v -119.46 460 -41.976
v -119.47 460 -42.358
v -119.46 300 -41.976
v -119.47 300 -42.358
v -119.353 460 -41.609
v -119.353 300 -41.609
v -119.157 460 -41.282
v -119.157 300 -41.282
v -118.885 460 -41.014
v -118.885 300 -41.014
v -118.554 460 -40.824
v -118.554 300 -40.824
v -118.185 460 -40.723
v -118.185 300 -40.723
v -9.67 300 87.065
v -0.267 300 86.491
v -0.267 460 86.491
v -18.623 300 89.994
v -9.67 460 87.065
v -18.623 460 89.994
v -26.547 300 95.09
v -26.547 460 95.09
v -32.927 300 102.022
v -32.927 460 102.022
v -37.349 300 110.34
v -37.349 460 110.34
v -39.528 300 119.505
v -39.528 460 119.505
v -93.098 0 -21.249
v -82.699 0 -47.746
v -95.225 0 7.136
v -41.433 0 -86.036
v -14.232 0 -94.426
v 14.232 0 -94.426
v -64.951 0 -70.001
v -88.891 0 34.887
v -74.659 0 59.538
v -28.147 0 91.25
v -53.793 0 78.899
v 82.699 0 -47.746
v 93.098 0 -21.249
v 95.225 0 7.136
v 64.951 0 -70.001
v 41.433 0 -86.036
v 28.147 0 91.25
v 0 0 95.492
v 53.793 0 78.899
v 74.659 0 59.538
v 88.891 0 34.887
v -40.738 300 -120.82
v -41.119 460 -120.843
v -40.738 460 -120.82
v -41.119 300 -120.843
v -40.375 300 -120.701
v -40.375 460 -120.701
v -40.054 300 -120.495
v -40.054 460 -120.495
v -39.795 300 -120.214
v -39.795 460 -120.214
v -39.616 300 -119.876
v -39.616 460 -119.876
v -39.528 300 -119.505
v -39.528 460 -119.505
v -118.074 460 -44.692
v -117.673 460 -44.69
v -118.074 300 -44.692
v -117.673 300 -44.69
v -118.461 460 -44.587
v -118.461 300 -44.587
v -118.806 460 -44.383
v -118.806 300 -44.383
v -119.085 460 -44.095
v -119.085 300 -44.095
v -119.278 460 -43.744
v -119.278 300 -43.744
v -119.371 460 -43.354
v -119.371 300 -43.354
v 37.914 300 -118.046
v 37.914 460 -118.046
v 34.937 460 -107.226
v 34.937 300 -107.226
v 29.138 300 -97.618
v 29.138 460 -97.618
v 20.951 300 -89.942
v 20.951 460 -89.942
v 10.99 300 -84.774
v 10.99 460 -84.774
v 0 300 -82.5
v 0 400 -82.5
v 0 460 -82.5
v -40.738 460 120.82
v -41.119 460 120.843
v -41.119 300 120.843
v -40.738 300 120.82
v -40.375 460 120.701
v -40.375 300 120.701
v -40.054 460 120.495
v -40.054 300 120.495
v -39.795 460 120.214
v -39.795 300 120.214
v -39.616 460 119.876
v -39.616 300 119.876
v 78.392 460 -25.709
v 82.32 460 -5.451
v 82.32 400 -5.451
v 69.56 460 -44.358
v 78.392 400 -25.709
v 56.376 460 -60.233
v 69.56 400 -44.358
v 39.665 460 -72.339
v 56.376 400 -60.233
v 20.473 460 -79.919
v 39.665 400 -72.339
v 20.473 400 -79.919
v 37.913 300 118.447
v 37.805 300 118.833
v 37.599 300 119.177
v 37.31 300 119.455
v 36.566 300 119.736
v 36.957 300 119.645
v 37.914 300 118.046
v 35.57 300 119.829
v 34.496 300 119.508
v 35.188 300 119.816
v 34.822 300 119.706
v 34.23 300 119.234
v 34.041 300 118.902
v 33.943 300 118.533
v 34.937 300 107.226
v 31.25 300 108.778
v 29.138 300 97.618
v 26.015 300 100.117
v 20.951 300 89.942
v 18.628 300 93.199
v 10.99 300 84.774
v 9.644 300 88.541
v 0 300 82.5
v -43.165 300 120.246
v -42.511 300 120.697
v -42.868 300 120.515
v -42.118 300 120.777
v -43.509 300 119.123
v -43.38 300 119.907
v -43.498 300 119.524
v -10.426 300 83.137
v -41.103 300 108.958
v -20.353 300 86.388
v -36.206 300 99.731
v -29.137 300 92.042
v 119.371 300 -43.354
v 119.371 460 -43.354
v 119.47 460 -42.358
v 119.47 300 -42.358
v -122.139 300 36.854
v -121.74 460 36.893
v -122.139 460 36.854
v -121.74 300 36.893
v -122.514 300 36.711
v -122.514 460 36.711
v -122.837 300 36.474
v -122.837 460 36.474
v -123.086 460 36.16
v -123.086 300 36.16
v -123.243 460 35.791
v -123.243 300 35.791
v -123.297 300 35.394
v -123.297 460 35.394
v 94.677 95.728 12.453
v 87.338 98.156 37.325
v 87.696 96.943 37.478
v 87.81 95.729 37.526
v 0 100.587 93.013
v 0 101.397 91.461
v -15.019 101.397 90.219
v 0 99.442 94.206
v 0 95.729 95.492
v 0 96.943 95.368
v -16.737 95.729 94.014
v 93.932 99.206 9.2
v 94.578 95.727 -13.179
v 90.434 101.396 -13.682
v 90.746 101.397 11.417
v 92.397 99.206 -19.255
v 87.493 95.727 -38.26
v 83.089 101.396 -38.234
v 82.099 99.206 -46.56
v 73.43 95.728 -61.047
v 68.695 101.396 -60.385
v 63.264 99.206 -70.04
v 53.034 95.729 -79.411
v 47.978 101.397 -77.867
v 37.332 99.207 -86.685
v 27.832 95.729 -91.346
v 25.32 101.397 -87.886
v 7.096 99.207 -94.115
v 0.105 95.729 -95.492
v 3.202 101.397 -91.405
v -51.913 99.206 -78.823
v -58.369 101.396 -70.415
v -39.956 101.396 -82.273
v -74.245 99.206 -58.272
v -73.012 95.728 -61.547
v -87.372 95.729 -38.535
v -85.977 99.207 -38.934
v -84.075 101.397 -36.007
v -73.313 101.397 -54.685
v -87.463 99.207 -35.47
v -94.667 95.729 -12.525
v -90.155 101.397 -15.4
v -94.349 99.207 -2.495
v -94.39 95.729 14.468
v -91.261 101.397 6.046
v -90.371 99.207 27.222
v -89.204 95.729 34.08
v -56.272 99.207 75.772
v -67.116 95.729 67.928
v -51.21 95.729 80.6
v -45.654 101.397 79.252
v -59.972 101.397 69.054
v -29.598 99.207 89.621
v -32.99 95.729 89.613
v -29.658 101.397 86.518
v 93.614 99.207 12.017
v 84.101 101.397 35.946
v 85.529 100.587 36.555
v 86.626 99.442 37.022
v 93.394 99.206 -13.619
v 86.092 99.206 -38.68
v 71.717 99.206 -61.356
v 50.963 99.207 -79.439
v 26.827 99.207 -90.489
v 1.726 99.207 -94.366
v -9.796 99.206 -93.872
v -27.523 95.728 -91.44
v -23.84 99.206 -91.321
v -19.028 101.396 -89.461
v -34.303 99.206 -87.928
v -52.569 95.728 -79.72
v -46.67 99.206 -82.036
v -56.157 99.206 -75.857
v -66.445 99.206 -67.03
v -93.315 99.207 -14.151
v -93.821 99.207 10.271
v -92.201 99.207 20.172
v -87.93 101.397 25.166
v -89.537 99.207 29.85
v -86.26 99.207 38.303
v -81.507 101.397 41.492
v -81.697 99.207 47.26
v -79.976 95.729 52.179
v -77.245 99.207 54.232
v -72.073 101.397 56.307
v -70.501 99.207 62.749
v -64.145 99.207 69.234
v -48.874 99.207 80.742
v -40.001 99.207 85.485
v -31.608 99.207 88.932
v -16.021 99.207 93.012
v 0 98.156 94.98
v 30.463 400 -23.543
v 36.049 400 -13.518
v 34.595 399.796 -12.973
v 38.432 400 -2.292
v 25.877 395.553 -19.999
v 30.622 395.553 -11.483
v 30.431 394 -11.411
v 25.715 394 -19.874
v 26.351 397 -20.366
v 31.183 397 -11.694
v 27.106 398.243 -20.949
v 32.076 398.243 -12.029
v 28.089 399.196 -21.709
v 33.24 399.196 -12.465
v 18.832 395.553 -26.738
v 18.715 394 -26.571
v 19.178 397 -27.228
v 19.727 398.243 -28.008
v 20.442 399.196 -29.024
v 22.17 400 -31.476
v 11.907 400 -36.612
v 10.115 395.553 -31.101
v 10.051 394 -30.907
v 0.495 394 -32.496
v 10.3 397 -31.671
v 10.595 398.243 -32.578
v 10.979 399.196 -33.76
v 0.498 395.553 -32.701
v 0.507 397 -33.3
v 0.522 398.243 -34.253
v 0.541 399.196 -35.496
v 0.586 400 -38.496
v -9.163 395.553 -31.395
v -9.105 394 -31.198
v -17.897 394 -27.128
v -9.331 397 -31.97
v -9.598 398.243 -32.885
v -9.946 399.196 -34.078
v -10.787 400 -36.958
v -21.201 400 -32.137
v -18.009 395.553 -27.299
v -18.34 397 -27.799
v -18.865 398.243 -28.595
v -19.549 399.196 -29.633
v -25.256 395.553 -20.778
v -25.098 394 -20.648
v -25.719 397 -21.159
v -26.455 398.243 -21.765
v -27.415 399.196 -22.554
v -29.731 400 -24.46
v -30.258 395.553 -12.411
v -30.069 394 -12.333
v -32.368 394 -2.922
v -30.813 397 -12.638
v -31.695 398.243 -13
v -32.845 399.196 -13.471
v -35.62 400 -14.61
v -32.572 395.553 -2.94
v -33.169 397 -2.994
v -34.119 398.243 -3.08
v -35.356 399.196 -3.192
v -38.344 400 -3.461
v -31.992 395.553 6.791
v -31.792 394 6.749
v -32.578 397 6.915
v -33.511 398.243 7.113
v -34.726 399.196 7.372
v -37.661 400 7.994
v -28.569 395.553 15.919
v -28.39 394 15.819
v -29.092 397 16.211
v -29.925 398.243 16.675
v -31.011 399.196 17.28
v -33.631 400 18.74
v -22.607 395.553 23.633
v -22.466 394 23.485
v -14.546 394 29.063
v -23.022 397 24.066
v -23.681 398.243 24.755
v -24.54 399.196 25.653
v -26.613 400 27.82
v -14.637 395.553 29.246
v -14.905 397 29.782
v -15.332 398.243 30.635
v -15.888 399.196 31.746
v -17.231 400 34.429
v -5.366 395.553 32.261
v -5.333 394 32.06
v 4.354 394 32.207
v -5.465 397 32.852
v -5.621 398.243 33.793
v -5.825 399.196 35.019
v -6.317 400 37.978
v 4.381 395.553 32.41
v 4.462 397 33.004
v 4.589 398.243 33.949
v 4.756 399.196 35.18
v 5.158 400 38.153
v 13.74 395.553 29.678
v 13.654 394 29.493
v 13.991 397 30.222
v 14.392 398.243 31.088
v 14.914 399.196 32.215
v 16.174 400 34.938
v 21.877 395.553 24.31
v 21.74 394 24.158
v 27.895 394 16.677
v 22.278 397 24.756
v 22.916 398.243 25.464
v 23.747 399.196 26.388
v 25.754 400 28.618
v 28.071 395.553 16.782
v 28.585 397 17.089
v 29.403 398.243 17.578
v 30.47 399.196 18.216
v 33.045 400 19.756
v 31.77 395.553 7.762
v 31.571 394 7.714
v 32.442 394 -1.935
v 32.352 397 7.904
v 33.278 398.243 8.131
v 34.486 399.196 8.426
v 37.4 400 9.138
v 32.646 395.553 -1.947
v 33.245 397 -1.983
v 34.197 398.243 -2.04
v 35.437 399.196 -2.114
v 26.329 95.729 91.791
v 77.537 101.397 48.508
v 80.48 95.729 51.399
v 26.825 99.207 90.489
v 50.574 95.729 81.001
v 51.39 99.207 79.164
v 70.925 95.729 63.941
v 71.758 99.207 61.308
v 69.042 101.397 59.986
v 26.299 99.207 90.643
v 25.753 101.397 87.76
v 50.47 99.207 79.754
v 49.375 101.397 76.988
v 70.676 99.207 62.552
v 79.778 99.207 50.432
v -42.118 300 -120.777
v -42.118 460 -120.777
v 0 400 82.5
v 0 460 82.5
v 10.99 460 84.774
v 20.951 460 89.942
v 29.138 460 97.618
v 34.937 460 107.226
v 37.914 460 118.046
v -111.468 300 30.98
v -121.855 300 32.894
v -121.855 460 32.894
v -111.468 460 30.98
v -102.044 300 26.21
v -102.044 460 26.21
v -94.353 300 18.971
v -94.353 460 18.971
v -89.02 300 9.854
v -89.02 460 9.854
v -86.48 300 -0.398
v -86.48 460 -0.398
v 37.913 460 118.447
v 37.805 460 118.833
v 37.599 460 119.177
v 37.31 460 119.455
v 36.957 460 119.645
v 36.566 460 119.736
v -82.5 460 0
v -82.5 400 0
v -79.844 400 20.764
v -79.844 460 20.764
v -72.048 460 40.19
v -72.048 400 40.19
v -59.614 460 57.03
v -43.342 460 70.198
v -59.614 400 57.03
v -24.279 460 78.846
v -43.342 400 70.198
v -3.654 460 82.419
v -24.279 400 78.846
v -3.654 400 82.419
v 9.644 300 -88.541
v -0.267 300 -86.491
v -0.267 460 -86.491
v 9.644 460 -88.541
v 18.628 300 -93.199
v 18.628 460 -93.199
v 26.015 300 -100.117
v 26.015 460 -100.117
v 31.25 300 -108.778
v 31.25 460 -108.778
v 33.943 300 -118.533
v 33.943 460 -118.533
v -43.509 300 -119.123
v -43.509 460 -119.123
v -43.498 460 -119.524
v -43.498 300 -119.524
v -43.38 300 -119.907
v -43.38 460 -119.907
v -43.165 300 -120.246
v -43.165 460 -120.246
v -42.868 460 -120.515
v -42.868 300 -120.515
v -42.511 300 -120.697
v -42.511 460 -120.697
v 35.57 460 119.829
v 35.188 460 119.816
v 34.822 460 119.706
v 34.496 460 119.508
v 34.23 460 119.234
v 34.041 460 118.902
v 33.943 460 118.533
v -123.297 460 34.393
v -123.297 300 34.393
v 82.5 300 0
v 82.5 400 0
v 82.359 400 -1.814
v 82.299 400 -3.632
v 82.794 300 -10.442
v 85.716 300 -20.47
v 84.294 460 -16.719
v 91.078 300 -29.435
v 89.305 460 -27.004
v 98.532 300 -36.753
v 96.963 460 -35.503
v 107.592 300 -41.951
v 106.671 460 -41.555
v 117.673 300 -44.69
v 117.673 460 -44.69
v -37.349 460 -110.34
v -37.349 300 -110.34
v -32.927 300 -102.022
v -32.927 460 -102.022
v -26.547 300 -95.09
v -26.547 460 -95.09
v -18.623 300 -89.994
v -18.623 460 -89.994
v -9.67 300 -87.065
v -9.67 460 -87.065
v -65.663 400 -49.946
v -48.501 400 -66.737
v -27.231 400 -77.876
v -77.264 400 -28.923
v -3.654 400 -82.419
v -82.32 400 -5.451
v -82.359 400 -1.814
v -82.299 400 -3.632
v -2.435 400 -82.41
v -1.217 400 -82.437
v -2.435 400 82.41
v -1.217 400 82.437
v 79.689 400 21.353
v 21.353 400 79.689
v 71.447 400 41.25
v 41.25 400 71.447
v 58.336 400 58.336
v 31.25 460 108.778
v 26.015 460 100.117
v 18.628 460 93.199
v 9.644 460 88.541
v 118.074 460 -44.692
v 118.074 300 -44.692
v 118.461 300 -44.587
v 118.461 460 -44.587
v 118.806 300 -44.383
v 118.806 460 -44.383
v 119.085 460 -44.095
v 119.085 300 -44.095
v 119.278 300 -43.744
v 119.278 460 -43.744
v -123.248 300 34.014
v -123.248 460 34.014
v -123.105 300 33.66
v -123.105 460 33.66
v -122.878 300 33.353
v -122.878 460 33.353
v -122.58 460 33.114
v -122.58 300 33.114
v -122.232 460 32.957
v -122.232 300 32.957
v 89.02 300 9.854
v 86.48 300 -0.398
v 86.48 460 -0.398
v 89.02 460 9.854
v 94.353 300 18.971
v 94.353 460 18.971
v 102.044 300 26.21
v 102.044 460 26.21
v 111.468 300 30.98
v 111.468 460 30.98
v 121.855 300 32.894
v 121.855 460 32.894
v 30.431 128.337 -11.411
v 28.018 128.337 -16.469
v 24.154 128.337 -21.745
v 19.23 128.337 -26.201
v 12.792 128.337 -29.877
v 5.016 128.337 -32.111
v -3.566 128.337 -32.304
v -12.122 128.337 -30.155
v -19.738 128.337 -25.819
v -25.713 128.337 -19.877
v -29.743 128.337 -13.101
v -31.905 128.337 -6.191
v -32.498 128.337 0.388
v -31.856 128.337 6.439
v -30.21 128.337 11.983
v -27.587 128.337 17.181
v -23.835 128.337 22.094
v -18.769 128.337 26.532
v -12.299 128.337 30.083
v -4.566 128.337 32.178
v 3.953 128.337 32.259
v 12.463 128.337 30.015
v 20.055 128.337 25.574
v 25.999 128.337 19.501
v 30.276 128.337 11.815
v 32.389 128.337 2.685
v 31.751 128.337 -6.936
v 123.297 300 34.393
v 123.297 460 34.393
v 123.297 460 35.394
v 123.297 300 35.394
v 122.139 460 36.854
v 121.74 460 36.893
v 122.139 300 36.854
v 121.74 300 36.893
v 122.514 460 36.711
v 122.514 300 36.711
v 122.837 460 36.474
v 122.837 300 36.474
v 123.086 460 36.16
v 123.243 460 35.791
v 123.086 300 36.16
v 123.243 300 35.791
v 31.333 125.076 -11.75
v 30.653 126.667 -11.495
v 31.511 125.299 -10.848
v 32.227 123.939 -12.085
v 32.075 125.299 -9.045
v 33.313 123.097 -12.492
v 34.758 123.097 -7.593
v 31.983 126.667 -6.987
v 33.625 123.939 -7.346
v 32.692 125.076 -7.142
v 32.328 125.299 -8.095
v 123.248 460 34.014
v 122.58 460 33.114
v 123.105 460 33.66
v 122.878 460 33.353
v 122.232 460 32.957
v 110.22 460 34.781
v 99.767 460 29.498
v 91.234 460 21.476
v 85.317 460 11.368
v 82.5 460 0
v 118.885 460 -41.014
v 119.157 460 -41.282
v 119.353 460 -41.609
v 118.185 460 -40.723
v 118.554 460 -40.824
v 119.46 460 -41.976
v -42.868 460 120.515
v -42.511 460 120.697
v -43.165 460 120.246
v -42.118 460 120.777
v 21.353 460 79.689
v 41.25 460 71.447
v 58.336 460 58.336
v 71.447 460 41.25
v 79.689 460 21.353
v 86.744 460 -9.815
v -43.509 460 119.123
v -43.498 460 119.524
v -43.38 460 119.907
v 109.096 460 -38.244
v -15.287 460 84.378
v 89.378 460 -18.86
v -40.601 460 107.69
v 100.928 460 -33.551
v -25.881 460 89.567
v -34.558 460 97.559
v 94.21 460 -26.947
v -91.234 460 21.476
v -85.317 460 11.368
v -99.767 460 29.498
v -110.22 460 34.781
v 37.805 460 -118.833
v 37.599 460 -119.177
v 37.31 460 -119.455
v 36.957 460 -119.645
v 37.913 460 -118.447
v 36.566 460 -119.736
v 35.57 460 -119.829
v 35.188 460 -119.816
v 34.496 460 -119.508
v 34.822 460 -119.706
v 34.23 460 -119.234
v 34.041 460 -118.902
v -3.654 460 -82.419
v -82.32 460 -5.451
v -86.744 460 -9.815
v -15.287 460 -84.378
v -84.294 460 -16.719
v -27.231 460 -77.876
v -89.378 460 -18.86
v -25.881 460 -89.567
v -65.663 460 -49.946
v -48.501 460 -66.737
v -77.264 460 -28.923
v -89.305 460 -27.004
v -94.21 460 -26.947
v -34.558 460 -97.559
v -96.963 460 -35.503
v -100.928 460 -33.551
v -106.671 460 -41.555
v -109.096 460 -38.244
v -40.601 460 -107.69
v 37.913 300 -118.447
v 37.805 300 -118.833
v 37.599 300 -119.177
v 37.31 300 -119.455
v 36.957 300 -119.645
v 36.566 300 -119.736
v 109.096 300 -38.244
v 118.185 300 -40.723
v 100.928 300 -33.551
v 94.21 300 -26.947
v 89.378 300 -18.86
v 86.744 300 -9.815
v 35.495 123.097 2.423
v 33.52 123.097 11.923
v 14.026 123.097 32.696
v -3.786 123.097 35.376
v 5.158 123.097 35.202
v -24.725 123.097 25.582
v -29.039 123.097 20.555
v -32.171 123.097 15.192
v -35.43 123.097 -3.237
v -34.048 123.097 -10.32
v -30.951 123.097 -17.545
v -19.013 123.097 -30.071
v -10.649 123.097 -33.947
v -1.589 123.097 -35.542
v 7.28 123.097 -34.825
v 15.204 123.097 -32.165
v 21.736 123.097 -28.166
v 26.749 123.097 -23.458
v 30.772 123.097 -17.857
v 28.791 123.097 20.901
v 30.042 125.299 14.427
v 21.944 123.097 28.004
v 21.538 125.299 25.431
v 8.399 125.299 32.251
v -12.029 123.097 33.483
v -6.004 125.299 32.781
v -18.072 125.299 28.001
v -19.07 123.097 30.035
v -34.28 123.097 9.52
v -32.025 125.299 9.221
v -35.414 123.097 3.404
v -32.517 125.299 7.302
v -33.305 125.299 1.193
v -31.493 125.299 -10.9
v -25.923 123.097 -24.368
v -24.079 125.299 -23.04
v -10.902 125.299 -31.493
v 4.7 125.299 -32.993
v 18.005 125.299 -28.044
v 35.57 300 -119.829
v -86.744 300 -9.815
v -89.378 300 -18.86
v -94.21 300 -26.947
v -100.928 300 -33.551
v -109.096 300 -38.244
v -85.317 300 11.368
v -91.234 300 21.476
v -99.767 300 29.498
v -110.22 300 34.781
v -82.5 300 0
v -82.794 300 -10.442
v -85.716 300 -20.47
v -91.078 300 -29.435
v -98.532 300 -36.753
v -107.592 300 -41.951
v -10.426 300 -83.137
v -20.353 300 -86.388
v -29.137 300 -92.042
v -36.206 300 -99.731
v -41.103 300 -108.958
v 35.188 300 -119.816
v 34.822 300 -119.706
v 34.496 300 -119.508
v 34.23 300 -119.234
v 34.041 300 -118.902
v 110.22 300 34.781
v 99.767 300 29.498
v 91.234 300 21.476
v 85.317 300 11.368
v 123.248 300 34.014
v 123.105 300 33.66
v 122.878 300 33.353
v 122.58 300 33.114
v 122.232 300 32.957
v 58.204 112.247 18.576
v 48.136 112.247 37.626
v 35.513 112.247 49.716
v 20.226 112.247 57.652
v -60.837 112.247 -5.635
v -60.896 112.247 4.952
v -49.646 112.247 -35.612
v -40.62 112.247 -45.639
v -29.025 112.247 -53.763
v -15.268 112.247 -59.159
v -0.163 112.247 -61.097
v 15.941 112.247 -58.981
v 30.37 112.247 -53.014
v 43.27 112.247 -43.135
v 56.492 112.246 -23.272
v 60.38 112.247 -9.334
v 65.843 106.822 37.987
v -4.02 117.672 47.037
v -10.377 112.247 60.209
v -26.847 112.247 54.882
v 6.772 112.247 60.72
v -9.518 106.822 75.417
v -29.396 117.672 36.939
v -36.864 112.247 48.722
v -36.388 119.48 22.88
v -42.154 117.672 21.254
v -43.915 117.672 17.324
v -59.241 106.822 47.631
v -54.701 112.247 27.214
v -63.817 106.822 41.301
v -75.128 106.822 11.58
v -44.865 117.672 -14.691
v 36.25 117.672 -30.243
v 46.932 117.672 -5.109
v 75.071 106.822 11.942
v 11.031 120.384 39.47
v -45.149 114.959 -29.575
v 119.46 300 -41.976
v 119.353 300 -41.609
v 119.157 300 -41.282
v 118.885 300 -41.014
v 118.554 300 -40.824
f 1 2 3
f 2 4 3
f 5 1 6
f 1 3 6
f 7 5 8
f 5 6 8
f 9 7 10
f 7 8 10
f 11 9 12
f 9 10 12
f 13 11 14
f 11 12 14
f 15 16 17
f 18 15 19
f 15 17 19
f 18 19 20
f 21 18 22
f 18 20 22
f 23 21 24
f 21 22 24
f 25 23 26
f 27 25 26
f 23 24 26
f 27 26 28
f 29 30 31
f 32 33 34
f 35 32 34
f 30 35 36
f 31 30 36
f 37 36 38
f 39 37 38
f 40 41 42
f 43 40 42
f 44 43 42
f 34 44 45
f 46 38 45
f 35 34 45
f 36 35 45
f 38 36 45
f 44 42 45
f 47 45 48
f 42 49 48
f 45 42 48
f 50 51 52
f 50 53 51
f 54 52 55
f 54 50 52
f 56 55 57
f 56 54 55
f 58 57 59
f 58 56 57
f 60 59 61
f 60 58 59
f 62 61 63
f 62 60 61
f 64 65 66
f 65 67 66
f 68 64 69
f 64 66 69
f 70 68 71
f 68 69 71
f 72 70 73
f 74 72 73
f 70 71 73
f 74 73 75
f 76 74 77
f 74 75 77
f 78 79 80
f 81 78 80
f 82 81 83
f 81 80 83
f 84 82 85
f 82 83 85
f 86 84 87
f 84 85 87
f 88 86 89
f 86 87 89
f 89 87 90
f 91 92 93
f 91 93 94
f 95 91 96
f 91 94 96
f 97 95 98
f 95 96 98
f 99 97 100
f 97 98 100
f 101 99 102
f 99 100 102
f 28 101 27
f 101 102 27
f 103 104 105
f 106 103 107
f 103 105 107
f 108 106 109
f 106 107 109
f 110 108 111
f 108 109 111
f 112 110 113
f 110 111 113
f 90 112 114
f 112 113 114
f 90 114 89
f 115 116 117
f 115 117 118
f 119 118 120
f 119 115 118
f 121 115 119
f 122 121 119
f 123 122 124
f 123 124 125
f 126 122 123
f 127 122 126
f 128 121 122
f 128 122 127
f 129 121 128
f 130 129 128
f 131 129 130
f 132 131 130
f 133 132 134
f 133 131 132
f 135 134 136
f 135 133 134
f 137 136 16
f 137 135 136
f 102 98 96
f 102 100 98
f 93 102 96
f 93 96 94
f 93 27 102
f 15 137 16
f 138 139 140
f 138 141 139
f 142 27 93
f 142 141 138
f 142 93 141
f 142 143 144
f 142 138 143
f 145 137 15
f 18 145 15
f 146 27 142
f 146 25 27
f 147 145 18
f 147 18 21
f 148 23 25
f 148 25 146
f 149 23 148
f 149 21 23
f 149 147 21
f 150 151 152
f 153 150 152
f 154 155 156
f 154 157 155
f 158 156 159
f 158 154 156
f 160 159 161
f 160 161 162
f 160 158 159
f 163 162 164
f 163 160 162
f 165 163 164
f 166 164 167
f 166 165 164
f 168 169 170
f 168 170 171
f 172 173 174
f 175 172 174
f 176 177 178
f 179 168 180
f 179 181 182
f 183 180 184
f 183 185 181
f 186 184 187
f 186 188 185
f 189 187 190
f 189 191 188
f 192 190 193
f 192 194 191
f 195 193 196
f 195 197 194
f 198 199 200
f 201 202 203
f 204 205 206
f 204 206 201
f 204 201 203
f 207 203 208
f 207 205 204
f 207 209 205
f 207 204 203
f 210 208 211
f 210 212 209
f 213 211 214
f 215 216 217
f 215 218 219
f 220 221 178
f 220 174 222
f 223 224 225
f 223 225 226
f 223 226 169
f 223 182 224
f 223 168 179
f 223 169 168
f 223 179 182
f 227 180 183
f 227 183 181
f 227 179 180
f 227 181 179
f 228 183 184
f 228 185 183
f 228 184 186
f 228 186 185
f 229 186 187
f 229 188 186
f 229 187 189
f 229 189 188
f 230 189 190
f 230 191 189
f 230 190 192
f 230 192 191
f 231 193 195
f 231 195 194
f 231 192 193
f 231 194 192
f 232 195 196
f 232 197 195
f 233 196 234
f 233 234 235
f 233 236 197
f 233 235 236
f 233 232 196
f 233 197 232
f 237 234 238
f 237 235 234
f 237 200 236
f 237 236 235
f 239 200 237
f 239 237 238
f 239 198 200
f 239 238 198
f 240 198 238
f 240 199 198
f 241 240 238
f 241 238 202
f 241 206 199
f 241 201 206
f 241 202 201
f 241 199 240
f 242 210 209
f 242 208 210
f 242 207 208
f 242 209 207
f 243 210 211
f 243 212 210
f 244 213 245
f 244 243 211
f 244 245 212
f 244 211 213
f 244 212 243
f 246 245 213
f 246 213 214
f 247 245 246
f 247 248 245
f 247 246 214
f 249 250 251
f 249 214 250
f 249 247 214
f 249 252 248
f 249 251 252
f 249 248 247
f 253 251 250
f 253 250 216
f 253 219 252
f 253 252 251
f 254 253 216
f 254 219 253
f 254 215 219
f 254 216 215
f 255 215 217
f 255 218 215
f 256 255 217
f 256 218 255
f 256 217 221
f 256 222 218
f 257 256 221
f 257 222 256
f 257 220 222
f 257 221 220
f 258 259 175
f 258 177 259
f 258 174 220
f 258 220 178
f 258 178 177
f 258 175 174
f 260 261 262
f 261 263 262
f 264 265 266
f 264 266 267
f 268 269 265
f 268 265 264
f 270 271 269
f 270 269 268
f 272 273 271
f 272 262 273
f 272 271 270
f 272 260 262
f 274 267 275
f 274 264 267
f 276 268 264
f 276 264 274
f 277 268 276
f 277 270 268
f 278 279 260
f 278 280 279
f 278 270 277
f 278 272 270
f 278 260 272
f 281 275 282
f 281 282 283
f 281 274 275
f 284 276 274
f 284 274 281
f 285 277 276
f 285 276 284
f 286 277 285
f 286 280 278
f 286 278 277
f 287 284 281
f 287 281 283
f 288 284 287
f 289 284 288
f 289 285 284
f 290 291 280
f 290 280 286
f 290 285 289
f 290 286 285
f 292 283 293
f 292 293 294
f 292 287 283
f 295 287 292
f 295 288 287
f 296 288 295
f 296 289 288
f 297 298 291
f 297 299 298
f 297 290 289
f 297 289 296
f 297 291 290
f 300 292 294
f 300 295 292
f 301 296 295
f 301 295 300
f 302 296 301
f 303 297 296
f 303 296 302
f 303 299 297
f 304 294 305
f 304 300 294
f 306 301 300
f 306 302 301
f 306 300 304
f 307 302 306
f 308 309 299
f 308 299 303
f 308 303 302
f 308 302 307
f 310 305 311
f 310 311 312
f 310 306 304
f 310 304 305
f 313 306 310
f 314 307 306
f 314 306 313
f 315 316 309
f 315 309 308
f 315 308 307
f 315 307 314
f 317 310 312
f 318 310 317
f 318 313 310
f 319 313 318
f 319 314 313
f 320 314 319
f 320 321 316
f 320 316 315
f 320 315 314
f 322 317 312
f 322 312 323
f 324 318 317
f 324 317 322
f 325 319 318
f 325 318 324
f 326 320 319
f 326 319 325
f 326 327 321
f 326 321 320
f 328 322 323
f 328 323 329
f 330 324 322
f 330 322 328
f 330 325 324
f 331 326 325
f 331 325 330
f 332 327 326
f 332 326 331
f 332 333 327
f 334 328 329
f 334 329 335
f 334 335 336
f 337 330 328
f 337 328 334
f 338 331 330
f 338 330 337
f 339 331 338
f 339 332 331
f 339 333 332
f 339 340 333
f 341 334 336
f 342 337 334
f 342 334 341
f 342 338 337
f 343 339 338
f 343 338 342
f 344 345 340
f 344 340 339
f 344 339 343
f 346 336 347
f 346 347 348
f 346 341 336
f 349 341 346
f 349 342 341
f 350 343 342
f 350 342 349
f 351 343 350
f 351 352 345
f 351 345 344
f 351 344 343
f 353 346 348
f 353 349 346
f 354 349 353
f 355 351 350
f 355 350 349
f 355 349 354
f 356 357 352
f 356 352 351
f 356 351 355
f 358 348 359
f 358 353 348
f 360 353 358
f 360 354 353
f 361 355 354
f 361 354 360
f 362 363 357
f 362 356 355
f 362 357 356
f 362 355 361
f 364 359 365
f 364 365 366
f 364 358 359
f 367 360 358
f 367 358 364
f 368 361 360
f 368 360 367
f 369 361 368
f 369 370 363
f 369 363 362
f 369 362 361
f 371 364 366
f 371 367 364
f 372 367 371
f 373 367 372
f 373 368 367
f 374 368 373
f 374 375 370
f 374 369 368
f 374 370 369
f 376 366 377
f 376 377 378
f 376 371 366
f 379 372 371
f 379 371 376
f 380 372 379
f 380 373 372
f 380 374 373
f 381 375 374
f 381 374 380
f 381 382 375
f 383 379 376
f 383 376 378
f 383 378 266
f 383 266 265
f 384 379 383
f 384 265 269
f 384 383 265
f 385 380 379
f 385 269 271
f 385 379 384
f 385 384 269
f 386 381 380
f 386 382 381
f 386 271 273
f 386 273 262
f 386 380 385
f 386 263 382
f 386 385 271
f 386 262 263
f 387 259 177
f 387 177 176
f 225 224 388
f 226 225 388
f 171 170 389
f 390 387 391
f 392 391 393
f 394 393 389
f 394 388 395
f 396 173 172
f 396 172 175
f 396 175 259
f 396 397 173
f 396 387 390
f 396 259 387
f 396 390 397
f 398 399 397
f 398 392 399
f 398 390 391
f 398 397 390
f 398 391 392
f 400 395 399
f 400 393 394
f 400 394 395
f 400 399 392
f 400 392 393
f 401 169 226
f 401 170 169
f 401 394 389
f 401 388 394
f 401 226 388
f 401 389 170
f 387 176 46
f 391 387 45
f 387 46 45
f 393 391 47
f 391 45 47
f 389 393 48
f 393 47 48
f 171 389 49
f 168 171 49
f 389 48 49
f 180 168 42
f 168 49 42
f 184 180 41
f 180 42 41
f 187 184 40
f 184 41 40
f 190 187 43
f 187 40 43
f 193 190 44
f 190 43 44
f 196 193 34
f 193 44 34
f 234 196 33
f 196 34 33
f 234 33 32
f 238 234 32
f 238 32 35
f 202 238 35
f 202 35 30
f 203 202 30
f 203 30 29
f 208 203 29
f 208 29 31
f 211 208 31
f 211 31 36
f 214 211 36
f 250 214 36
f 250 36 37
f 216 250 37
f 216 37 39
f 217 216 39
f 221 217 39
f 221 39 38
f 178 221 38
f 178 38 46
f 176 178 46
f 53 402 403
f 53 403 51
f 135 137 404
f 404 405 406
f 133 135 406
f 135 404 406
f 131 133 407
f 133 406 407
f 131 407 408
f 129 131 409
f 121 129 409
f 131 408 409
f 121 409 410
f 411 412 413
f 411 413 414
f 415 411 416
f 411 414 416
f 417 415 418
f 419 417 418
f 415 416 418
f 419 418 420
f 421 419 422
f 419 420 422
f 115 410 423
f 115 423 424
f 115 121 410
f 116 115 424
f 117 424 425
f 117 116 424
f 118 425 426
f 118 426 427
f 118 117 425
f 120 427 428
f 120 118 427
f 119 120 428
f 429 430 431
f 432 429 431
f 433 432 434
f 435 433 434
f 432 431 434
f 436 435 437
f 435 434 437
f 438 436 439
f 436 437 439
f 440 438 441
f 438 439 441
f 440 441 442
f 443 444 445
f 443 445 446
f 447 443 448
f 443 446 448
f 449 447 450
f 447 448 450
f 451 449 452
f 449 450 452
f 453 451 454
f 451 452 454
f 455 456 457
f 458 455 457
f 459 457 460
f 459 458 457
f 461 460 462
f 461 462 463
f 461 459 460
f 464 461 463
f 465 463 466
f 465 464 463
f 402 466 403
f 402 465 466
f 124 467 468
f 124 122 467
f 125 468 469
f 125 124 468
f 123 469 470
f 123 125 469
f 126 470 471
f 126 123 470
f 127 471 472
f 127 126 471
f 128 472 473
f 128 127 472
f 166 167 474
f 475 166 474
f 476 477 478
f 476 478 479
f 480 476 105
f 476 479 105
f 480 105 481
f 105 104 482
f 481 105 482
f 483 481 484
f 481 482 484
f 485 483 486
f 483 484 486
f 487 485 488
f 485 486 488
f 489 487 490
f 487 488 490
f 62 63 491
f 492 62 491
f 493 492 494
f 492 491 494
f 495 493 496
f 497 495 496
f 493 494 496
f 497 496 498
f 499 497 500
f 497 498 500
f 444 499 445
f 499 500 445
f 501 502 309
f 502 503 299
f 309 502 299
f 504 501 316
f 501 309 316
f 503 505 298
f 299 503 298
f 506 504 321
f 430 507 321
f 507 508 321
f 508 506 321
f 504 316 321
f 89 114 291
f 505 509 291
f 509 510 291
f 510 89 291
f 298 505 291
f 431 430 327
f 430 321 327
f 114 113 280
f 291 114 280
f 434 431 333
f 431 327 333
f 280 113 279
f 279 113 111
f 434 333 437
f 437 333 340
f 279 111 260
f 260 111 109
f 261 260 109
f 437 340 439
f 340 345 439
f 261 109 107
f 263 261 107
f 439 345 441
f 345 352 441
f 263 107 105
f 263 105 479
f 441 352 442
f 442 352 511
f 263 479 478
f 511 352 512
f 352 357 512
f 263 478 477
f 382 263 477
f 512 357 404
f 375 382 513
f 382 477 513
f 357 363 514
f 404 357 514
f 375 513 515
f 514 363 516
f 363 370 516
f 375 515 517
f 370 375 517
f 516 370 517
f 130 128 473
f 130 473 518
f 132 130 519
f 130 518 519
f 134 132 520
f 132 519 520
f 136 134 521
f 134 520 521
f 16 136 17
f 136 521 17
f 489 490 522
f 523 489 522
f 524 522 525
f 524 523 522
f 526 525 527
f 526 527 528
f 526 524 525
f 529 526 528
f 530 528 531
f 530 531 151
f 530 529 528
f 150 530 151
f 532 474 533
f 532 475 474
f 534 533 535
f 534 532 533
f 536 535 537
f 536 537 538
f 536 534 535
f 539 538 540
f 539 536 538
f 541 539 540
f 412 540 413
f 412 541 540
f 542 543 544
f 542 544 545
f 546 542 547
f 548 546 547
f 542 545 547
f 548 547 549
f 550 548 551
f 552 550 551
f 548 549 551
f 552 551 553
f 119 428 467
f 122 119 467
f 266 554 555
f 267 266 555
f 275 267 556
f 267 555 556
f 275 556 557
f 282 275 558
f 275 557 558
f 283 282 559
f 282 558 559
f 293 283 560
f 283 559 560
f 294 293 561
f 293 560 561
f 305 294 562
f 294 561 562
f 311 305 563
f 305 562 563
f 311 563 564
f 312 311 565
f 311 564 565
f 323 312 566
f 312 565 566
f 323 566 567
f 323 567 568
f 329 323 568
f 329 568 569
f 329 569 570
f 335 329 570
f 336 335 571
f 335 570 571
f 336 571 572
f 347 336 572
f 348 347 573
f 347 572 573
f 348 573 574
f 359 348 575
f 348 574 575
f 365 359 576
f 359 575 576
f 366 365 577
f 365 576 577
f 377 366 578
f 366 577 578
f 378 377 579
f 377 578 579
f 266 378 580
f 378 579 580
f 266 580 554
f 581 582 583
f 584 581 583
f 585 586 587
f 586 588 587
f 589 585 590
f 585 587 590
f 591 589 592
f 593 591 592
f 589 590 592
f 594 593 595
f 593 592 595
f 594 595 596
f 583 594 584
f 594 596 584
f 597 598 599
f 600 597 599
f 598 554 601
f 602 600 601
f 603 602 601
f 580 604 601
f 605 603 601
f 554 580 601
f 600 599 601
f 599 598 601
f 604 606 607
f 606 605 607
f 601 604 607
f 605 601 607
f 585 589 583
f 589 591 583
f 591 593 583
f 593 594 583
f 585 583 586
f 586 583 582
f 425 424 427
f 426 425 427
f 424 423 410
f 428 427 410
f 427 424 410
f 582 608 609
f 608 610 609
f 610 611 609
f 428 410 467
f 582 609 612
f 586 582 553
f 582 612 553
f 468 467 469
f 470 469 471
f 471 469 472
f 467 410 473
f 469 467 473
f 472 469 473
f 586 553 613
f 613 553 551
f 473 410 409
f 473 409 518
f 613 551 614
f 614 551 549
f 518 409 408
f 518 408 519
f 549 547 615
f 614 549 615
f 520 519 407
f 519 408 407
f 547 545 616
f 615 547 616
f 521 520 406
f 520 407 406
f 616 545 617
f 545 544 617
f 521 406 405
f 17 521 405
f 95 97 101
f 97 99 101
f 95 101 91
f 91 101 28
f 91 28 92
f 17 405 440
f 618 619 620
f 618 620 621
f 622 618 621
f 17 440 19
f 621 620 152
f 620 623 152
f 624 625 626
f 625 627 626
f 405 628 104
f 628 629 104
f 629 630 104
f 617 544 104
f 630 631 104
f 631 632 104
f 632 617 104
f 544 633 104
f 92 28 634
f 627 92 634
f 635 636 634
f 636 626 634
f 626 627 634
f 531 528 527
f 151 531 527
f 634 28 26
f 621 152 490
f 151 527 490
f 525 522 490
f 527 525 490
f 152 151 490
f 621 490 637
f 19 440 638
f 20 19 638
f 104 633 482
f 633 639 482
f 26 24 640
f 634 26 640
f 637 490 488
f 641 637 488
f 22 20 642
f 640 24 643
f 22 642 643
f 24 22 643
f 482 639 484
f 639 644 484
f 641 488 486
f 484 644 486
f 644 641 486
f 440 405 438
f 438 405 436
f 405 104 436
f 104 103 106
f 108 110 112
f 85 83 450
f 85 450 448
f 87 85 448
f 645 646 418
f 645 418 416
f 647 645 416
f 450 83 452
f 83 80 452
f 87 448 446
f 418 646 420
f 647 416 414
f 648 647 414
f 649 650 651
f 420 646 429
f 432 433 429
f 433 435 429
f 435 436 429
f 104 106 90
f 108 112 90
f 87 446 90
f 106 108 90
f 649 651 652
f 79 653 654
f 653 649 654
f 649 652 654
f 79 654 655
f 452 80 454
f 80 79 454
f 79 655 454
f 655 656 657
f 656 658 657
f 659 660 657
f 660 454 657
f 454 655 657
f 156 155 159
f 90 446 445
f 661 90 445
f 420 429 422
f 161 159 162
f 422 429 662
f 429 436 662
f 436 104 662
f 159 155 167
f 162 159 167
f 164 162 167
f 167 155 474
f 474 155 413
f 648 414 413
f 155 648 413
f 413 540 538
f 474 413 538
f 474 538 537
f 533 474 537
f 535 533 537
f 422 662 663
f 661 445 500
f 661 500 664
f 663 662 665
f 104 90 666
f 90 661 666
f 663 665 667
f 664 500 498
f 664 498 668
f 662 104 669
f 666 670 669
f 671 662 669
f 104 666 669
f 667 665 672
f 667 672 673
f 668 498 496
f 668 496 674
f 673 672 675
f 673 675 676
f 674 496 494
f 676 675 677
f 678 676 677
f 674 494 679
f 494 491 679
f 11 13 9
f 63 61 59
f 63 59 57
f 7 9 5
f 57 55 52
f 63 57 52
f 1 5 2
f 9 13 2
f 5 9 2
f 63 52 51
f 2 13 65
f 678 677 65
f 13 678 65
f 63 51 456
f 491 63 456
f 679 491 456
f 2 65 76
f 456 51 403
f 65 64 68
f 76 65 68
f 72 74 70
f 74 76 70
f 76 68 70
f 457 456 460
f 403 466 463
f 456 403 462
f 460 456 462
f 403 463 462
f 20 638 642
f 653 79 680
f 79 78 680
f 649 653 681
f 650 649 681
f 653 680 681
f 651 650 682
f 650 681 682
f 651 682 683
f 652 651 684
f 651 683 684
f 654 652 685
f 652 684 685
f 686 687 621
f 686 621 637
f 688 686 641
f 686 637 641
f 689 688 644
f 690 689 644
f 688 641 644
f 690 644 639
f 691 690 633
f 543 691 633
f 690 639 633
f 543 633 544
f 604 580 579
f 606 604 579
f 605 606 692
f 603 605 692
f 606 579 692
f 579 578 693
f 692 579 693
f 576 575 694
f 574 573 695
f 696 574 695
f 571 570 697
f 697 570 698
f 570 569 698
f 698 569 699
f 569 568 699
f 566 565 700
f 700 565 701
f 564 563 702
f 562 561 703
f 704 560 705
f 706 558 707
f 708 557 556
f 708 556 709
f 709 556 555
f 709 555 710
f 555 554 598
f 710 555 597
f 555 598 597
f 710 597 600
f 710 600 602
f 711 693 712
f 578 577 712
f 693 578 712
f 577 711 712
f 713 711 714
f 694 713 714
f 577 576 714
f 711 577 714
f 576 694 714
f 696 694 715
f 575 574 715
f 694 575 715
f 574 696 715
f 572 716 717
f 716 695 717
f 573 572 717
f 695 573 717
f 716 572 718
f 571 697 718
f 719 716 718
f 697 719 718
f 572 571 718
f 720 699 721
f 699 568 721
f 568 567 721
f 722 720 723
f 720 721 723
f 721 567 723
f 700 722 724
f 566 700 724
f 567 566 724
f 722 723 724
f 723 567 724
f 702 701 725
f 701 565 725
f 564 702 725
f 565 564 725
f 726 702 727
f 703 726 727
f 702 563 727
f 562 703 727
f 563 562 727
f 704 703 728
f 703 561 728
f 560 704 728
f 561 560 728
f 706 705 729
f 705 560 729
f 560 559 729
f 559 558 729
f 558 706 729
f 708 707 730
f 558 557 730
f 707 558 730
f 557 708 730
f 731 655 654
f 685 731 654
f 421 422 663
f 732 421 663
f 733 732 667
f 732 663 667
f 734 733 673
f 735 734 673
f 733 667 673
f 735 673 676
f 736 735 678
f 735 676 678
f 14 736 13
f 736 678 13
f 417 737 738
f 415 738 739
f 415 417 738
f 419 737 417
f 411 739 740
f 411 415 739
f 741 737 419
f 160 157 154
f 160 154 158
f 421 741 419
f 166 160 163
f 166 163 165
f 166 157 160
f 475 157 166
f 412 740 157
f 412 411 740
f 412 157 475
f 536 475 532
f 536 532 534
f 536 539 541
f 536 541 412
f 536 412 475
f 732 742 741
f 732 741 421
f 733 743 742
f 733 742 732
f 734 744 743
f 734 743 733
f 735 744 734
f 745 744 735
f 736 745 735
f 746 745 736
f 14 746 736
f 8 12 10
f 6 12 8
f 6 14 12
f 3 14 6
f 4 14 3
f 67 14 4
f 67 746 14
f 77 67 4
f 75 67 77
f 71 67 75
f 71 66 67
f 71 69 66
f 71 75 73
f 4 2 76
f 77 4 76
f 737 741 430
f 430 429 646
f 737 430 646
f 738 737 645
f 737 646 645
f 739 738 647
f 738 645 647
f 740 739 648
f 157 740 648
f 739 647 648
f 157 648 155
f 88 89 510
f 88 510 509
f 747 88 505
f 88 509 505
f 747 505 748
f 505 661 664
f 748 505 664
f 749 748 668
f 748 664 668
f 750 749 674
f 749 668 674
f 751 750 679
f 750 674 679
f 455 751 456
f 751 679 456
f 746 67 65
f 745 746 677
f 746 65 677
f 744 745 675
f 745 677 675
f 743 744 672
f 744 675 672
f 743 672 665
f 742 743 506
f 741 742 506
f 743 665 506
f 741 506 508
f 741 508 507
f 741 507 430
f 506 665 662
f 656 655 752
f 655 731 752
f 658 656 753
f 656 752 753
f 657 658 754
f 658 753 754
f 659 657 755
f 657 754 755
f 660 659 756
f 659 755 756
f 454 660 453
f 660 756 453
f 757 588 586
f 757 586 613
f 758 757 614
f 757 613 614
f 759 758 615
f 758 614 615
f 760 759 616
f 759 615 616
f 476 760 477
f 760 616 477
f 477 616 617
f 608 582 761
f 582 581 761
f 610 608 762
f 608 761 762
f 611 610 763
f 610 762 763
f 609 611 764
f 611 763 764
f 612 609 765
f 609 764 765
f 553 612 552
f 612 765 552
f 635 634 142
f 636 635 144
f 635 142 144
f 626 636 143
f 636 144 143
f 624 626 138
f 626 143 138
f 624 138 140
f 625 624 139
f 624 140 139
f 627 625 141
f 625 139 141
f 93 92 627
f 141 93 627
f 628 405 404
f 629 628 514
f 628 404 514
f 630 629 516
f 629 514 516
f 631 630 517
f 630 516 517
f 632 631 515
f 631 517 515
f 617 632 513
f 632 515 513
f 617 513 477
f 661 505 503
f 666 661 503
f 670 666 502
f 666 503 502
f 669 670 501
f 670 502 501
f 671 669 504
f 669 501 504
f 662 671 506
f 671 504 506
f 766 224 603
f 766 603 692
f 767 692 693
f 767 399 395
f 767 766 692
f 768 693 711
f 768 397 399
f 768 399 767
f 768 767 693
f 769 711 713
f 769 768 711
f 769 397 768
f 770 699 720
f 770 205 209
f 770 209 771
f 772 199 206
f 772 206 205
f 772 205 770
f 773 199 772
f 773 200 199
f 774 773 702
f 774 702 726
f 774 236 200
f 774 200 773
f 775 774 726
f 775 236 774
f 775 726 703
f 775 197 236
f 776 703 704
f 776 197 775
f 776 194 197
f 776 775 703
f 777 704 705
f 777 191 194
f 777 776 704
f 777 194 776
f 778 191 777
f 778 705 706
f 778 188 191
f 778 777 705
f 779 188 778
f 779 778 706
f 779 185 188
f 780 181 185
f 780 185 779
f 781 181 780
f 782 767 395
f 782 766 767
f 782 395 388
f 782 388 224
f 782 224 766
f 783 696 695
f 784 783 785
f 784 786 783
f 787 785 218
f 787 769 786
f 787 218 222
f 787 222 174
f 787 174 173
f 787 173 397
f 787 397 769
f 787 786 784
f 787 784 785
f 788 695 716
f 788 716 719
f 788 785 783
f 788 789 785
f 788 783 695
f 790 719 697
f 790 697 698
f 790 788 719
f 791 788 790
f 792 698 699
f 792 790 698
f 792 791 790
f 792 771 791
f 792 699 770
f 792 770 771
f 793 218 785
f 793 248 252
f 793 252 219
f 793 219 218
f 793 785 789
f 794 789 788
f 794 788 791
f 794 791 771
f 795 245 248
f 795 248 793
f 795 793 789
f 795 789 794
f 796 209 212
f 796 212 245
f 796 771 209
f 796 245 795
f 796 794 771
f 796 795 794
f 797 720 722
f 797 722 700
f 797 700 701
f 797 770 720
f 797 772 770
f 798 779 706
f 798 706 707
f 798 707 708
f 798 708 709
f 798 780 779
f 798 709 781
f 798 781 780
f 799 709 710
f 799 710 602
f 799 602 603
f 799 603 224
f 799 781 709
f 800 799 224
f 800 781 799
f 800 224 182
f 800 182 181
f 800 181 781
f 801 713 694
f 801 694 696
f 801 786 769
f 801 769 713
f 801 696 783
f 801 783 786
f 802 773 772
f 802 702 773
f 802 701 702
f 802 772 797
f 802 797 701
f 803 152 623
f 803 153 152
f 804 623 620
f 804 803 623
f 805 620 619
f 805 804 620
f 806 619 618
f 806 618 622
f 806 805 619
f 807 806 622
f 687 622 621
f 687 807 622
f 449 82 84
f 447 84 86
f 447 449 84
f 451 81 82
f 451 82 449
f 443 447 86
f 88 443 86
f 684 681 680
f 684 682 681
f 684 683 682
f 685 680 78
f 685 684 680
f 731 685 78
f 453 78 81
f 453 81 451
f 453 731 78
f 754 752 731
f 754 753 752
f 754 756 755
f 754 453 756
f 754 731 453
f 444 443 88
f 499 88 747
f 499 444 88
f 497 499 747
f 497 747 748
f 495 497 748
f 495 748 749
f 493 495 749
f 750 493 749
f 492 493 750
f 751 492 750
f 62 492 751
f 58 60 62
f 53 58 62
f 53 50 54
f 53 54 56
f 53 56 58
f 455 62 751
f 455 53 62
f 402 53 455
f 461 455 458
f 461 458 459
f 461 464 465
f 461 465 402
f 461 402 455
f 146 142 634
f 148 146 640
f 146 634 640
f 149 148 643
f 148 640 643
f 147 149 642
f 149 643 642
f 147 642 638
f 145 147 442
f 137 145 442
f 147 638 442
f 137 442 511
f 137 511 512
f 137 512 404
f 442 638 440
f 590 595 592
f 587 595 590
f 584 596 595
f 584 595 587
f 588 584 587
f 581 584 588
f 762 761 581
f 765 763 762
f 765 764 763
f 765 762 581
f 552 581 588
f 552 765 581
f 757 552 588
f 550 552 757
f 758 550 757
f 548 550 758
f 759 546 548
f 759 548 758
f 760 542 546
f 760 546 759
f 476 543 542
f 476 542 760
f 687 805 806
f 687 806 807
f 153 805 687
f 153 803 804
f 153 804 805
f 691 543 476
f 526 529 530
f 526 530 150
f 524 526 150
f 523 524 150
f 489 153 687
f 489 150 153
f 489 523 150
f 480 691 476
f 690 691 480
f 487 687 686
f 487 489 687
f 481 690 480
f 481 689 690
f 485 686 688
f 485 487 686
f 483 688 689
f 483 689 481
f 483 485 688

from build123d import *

# Parameters (mm, degrees)
SKETCH1_R           = 95.492297116
BOSS_EXTRUDE1_DEPTH = 100
SKETCH3_3_R         = 32.5
TUBE_DEPTH          = 275
SKETCH5_R           = 82.5
TOP_HUB_DEPTH       = 60
BLADES_DEPTH        = 160
FILLET3_R           = 1.5
FILLET5_R           = 6
FILLET6_R           = 6


with BuildPart() as part:
    # Sketch1 → Boss-Extrude1 (new body)
    with BuildSketch(Plane(origin=(0, 0, 0), x_dir=(1, 0, 0), z_dir=(0, 1, 0))):
        with Locations(Location((0, 0, 0), (0, 0, 270))):
            Circle(SKETCH1_R)
    extrude(amount=BOSS_EXTRUDE1_DEPTH)

    # Loft2: read off the stored shape, not the designer's step
    # Loft2: loft between two sections, ruled curve by curve
    loft2_from = [
        Edge.make_bspline([(30.430707277, 125, -11.411487835), (53.253682947, 125, 49.44992672), (-7.607731608, 125, 72.272902389), (-30.430707277, 125, 11.411487835), (-53.253682947, 125, -49.44992672), (7.607731608, 125, -72.272902389), (30.430707277, 125, -11.411487835)], [0, 0, 0, 0, 0.5, 0.5, 0.5, 1, 1, 1, 1], 3, [1, 0.333333333, 0.333333333, 1, 0.333333333, 0.333333333, 1]),
    ]
    loft2_to = [
        Edge.make_bspline([(87.277179809, 100, 38.748841183), (9.779497444, 100, 213.303200802), (-164.774862175, 100, 135.805518436), (-87.277179809, 100, -38.748841183), (-9.779497444, 100, -213.303200802), (164.774862175, 100, -135.805518436), (87.277179809, 100, 38.748841183)], [0, 0, 0, 0, 0.5, 0.5, 0.5, 1, 1, 1, 1], 3, [1, 0.333333333, 0.333333333, 1, 0.333333333, 0.333333333, 1]),
    ]
    loft2 = Solid(Shell([*[Face.make_surface_from_curves(loft2_from[k], loft2_to[k]) for k in range(1)], Face(Wire(loft2_from)), Face(Wire(loft2_to))]))
    add(loft2)

    # Sketch3<3> → tube (add)
    with BuildSketch(Plane(origin=(0, 125, 0), x_dir=(1, 0, 0), z_dir=(0, 1, 0))):
        with Locations(Location((0, 0, 0), (0, 0, 20.556))):
            Circle(SKETCH3_3_R)
    extrude(amount=TUBE_DEPTH)

    # Sketch5 → top_hub (add)
    with BuildSketch(Plane(origin=(0, 400, 0), x_dir=(1, 0, 0), z_dir=(0, 1, 0))):
        with Locations(Location((0, 0, 0), (0, 0, 270))):
            Circle(SKETCH5_R)
    extrude(amount=TOP_HUB_DEPTH)

    # Sketch8 → Blades (add)
    with BuildSketch(Plane(origin=(0, 460, 0), x_dir=(1, 0, 0), z_dir=(0, 1, 0))):
        with BuildLine():
            ThreePointArc((123.296710019, -36.922200146), (95.784801634, -26.321129354), (82.5, 0))
            ThreePointArc((82.5, 0), (91.565639785, 30.041990229), (119.218910164, 44.874509873))
            Line((119.218910164, 44.874509873), (119.616744296, 40.894343042))
            ThreePointArc((119.616744296, 40.894343042), (94.661353954, 27.508898485), (86.480166831, 0.397834132))
            ThreePointArc((86.480166831, 0.397834132), (98.468890257, -23.355380163), (123.296710019, -32.922200146))
            Line((123.296710019, -32.922200146), (123.296710019, -36.922200146))
        make_face()
        with BuildLine():
            ThreePointArc((-119.218910164, 44.874509873), (-91.565639785, 30.041990229), (-82.5, 0))
            ThreePointArc((-82.5, 0), (-95.784801634, -26.321129354), (-123.296710019, -36.922200146))
            Line((-123.296710019, -36.922200146), (-123.296710019, -32.922200146))
            ThreePointArc((-123.296710019, -32.922200146), (-98.468890257, -23.355380163), (-86.480166831, 0.397834132))
            ThreePointArc((-86.480166831, 0.397834132), (-94.661353954, 27.508898485), (-119.616744296, 40.894343042))
            Line((-119.616744296, 40.894343042), (-119.218910164, 44.874509873))
        make_face()
        with BuildLine():
            ThreePointArc((38.088025782, 119.593401567), (25.871262622, 94.036384856), (0, 82.5))
            ThreePointArc((0, 82.5), (-29.727635854, 92.548615238), (-43.642804778, 120.674672115))
            Line((-43.642804778, 120.674672115), (-39.651708344, 120.941410294))
            ThreePointArc((-39.651708344, 120.941410294), (-27.094116876, 95.559358966), (-0.266738179, 86.491096434))
            ThreePointArc((-0.266738179, 86.491096434), (23.080498822, 96.901980328), (34.105382649, 119.965629555))
            Line((34.105382649, 119.965629555), (38.088025782, 119.593401567))
        make_face()
        with BuildLine():
            ThreePointArc((-43.642804778, -120.674672115), (-29.727635854, -92.548615238), (0, -82.5))
            ThreePointArc((0, -82.5), (25.871262622, -94.036384856), (38.088025782, -119.593401567))
            Line((38.088025782, -119.593401567), (34.105382649, -119.965629555))
            ThreePointArc((34.105382649, -119.965629555), (23.080498822, -96.901980328), (-0.266738179, -86.491096434))
            ThreePointArc((-0.266738179, -86.491096434), (-27.094116876, -95.559358966), (-39.651708344, -120.941410294))
            Line((-39.651708344, -120.941410294), (-43.642804778, -120.674672115))
        make_face()
    extrude(amount=-BLADES_DEPTH)

    # Fillet3
    fillet3_edges = [part.edges().sort_by_distance(p)[0] for p in [
        (123.296710019, 380, 36.922200146),
        (119.218910164, 380, -44.874509873),
        (119.616744296, 380, -40.894343042),
        (123.296710019, 380, 32.922200146),
        (-119.218910164, 380, -44.874509873),
        (-123.296710019, 380, 36.922200146),
        (-123.296710019, 380, 32.922200146),
        (-119.616744296, 380, -40.894343042),
        (38.088025782, 380, -119.593401567),
        (-43.642804778, 380, -120.674672115),
        (-39.651708344, 380, -120.941410294),
        (34.105382649, 380, -119.965629555),
        (-43.642804778, 380, 120.674672115),
        (38.088025782, 380, 119.593401567),
        (34.105382649, 380, 119.965629555),
        (-39.651708344, 380, 120.941410294),
    ]]
    fillet(fillet3_edges, radius=FILLET3_R)

    # Fillet5
    fillet5_edges = [part.edges().sort_by_distance(p)[0] for p in [
        (52.050758656, 100, 80.059336319),
        (-30.430707277, 125, 11.411487835),
    ]]
    fillet(fillet5_edges, radius=FILLET5_R)

    # Fillet6
    fillet6_edges = [part.edges().sort_by_distance(p)[0] for p in [
        (-30.430707277, 400, 11.411487835),
    ]]
    fillet(fillet6_edges, radius=FILLET6_R)


solid = part.part
